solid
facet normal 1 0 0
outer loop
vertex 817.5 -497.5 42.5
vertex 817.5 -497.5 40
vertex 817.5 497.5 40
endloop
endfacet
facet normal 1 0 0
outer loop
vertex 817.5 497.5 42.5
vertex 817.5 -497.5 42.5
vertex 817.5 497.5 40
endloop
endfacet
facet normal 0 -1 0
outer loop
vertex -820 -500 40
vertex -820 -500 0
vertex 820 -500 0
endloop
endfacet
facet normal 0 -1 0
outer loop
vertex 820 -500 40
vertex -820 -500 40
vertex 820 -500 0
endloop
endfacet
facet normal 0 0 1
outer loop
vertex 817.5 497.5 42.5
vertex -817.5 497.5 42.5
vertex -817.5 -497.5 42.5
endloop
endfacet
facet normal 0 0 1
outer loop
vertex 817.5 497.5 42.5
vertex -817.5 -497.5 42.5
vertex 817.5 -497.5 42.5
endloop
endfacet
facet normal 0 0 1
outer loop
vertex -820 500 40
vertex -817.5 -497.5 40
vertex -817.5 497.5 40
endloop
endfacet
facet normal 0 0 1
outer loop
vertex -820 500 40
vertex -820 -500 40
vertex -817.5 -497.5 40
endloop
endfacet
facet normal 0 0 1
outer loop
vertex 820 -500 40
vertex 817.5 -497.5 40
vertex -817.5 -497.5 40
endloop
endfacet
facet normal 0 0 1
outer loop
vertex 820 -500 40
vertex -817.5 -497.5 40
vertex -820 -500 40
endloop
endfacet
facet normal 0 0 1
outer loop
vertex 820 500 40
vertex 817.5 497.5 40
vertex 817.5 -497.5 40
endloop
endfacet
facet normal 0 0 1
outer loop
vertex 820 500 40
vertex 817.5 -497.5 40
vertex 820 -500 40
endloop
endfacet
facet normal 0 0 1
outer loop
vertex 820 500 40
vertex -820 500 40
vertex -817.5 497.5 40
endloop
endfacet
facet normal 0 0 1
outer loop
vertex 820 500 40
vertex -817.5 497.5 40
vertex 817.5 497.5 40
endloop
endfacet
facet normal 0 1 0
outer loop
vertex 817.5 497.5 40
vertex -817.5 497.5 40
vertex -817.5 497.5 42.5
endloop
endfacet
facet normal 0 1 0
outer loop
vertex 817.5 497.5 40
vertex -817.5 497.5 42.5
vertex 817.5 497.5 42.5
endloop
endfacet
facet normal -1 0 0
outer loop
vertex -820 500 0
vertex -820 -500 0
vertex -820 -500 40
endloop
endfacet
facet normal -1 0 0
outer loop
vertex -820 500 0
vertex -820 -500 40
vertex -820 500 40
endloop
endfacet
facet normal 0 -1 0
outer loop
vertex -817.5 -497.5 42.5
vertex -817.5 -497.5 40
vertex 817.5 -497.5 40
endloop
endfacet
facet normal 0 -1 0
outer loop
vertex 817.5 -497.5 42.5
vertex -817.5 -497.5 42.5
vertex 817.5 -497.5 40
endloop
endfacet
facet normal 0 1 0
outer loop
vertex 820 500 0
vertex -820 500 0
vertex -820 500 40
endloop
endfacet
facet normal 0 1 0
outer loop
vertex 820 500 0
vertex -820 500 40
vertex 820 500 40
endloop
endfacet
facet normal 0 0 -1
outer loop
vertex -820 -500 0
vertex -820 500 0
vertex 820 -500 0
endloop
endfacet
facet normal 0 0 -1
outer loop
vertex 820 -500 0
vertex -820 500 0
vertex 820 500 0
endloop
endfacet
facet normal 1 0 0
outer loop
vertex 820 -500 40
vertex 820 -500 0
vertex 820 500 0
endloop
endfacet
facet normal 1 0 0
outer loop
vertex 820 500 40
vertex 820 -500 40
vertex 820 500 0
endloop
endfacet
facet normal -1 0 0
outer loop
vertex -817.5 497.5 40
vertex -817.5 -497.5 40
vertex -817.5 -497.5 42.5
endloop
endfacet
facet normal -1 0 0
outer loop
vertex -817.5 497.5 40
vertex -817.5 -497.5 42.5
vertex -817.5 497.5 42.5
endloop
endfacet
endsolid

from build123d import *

# Parameters (mm, degrees)
F0_W     = 1640
F0_H     = 1000
F1_DEPTH = 40
F2_T     = -2.5
F3_DEPTH = 40


with BuildPart() as f1:
    # F0 (on Top) → F1 (new body)
    with BuildSketch(Plane.XY):
        Rectangle(F0_W, F0_H)
    extrude(amount=F1_DEPTH)

    # F2
    f2_openings = [f1.faces().sort_by_distance(p)[0] for p in [
        (0, 0, 40),
    ]]
    offset(amount=F2_T, openings=f2_openings)

    # F3 (add): a face of the model
    f3_faces = [f1.faces().sort_by_distance(p)[0] for p in [
        (0, 0, 2.5),
    ]]
    extrude(f3_faces, amount=F3_DEPTH)


solid = f1.part
